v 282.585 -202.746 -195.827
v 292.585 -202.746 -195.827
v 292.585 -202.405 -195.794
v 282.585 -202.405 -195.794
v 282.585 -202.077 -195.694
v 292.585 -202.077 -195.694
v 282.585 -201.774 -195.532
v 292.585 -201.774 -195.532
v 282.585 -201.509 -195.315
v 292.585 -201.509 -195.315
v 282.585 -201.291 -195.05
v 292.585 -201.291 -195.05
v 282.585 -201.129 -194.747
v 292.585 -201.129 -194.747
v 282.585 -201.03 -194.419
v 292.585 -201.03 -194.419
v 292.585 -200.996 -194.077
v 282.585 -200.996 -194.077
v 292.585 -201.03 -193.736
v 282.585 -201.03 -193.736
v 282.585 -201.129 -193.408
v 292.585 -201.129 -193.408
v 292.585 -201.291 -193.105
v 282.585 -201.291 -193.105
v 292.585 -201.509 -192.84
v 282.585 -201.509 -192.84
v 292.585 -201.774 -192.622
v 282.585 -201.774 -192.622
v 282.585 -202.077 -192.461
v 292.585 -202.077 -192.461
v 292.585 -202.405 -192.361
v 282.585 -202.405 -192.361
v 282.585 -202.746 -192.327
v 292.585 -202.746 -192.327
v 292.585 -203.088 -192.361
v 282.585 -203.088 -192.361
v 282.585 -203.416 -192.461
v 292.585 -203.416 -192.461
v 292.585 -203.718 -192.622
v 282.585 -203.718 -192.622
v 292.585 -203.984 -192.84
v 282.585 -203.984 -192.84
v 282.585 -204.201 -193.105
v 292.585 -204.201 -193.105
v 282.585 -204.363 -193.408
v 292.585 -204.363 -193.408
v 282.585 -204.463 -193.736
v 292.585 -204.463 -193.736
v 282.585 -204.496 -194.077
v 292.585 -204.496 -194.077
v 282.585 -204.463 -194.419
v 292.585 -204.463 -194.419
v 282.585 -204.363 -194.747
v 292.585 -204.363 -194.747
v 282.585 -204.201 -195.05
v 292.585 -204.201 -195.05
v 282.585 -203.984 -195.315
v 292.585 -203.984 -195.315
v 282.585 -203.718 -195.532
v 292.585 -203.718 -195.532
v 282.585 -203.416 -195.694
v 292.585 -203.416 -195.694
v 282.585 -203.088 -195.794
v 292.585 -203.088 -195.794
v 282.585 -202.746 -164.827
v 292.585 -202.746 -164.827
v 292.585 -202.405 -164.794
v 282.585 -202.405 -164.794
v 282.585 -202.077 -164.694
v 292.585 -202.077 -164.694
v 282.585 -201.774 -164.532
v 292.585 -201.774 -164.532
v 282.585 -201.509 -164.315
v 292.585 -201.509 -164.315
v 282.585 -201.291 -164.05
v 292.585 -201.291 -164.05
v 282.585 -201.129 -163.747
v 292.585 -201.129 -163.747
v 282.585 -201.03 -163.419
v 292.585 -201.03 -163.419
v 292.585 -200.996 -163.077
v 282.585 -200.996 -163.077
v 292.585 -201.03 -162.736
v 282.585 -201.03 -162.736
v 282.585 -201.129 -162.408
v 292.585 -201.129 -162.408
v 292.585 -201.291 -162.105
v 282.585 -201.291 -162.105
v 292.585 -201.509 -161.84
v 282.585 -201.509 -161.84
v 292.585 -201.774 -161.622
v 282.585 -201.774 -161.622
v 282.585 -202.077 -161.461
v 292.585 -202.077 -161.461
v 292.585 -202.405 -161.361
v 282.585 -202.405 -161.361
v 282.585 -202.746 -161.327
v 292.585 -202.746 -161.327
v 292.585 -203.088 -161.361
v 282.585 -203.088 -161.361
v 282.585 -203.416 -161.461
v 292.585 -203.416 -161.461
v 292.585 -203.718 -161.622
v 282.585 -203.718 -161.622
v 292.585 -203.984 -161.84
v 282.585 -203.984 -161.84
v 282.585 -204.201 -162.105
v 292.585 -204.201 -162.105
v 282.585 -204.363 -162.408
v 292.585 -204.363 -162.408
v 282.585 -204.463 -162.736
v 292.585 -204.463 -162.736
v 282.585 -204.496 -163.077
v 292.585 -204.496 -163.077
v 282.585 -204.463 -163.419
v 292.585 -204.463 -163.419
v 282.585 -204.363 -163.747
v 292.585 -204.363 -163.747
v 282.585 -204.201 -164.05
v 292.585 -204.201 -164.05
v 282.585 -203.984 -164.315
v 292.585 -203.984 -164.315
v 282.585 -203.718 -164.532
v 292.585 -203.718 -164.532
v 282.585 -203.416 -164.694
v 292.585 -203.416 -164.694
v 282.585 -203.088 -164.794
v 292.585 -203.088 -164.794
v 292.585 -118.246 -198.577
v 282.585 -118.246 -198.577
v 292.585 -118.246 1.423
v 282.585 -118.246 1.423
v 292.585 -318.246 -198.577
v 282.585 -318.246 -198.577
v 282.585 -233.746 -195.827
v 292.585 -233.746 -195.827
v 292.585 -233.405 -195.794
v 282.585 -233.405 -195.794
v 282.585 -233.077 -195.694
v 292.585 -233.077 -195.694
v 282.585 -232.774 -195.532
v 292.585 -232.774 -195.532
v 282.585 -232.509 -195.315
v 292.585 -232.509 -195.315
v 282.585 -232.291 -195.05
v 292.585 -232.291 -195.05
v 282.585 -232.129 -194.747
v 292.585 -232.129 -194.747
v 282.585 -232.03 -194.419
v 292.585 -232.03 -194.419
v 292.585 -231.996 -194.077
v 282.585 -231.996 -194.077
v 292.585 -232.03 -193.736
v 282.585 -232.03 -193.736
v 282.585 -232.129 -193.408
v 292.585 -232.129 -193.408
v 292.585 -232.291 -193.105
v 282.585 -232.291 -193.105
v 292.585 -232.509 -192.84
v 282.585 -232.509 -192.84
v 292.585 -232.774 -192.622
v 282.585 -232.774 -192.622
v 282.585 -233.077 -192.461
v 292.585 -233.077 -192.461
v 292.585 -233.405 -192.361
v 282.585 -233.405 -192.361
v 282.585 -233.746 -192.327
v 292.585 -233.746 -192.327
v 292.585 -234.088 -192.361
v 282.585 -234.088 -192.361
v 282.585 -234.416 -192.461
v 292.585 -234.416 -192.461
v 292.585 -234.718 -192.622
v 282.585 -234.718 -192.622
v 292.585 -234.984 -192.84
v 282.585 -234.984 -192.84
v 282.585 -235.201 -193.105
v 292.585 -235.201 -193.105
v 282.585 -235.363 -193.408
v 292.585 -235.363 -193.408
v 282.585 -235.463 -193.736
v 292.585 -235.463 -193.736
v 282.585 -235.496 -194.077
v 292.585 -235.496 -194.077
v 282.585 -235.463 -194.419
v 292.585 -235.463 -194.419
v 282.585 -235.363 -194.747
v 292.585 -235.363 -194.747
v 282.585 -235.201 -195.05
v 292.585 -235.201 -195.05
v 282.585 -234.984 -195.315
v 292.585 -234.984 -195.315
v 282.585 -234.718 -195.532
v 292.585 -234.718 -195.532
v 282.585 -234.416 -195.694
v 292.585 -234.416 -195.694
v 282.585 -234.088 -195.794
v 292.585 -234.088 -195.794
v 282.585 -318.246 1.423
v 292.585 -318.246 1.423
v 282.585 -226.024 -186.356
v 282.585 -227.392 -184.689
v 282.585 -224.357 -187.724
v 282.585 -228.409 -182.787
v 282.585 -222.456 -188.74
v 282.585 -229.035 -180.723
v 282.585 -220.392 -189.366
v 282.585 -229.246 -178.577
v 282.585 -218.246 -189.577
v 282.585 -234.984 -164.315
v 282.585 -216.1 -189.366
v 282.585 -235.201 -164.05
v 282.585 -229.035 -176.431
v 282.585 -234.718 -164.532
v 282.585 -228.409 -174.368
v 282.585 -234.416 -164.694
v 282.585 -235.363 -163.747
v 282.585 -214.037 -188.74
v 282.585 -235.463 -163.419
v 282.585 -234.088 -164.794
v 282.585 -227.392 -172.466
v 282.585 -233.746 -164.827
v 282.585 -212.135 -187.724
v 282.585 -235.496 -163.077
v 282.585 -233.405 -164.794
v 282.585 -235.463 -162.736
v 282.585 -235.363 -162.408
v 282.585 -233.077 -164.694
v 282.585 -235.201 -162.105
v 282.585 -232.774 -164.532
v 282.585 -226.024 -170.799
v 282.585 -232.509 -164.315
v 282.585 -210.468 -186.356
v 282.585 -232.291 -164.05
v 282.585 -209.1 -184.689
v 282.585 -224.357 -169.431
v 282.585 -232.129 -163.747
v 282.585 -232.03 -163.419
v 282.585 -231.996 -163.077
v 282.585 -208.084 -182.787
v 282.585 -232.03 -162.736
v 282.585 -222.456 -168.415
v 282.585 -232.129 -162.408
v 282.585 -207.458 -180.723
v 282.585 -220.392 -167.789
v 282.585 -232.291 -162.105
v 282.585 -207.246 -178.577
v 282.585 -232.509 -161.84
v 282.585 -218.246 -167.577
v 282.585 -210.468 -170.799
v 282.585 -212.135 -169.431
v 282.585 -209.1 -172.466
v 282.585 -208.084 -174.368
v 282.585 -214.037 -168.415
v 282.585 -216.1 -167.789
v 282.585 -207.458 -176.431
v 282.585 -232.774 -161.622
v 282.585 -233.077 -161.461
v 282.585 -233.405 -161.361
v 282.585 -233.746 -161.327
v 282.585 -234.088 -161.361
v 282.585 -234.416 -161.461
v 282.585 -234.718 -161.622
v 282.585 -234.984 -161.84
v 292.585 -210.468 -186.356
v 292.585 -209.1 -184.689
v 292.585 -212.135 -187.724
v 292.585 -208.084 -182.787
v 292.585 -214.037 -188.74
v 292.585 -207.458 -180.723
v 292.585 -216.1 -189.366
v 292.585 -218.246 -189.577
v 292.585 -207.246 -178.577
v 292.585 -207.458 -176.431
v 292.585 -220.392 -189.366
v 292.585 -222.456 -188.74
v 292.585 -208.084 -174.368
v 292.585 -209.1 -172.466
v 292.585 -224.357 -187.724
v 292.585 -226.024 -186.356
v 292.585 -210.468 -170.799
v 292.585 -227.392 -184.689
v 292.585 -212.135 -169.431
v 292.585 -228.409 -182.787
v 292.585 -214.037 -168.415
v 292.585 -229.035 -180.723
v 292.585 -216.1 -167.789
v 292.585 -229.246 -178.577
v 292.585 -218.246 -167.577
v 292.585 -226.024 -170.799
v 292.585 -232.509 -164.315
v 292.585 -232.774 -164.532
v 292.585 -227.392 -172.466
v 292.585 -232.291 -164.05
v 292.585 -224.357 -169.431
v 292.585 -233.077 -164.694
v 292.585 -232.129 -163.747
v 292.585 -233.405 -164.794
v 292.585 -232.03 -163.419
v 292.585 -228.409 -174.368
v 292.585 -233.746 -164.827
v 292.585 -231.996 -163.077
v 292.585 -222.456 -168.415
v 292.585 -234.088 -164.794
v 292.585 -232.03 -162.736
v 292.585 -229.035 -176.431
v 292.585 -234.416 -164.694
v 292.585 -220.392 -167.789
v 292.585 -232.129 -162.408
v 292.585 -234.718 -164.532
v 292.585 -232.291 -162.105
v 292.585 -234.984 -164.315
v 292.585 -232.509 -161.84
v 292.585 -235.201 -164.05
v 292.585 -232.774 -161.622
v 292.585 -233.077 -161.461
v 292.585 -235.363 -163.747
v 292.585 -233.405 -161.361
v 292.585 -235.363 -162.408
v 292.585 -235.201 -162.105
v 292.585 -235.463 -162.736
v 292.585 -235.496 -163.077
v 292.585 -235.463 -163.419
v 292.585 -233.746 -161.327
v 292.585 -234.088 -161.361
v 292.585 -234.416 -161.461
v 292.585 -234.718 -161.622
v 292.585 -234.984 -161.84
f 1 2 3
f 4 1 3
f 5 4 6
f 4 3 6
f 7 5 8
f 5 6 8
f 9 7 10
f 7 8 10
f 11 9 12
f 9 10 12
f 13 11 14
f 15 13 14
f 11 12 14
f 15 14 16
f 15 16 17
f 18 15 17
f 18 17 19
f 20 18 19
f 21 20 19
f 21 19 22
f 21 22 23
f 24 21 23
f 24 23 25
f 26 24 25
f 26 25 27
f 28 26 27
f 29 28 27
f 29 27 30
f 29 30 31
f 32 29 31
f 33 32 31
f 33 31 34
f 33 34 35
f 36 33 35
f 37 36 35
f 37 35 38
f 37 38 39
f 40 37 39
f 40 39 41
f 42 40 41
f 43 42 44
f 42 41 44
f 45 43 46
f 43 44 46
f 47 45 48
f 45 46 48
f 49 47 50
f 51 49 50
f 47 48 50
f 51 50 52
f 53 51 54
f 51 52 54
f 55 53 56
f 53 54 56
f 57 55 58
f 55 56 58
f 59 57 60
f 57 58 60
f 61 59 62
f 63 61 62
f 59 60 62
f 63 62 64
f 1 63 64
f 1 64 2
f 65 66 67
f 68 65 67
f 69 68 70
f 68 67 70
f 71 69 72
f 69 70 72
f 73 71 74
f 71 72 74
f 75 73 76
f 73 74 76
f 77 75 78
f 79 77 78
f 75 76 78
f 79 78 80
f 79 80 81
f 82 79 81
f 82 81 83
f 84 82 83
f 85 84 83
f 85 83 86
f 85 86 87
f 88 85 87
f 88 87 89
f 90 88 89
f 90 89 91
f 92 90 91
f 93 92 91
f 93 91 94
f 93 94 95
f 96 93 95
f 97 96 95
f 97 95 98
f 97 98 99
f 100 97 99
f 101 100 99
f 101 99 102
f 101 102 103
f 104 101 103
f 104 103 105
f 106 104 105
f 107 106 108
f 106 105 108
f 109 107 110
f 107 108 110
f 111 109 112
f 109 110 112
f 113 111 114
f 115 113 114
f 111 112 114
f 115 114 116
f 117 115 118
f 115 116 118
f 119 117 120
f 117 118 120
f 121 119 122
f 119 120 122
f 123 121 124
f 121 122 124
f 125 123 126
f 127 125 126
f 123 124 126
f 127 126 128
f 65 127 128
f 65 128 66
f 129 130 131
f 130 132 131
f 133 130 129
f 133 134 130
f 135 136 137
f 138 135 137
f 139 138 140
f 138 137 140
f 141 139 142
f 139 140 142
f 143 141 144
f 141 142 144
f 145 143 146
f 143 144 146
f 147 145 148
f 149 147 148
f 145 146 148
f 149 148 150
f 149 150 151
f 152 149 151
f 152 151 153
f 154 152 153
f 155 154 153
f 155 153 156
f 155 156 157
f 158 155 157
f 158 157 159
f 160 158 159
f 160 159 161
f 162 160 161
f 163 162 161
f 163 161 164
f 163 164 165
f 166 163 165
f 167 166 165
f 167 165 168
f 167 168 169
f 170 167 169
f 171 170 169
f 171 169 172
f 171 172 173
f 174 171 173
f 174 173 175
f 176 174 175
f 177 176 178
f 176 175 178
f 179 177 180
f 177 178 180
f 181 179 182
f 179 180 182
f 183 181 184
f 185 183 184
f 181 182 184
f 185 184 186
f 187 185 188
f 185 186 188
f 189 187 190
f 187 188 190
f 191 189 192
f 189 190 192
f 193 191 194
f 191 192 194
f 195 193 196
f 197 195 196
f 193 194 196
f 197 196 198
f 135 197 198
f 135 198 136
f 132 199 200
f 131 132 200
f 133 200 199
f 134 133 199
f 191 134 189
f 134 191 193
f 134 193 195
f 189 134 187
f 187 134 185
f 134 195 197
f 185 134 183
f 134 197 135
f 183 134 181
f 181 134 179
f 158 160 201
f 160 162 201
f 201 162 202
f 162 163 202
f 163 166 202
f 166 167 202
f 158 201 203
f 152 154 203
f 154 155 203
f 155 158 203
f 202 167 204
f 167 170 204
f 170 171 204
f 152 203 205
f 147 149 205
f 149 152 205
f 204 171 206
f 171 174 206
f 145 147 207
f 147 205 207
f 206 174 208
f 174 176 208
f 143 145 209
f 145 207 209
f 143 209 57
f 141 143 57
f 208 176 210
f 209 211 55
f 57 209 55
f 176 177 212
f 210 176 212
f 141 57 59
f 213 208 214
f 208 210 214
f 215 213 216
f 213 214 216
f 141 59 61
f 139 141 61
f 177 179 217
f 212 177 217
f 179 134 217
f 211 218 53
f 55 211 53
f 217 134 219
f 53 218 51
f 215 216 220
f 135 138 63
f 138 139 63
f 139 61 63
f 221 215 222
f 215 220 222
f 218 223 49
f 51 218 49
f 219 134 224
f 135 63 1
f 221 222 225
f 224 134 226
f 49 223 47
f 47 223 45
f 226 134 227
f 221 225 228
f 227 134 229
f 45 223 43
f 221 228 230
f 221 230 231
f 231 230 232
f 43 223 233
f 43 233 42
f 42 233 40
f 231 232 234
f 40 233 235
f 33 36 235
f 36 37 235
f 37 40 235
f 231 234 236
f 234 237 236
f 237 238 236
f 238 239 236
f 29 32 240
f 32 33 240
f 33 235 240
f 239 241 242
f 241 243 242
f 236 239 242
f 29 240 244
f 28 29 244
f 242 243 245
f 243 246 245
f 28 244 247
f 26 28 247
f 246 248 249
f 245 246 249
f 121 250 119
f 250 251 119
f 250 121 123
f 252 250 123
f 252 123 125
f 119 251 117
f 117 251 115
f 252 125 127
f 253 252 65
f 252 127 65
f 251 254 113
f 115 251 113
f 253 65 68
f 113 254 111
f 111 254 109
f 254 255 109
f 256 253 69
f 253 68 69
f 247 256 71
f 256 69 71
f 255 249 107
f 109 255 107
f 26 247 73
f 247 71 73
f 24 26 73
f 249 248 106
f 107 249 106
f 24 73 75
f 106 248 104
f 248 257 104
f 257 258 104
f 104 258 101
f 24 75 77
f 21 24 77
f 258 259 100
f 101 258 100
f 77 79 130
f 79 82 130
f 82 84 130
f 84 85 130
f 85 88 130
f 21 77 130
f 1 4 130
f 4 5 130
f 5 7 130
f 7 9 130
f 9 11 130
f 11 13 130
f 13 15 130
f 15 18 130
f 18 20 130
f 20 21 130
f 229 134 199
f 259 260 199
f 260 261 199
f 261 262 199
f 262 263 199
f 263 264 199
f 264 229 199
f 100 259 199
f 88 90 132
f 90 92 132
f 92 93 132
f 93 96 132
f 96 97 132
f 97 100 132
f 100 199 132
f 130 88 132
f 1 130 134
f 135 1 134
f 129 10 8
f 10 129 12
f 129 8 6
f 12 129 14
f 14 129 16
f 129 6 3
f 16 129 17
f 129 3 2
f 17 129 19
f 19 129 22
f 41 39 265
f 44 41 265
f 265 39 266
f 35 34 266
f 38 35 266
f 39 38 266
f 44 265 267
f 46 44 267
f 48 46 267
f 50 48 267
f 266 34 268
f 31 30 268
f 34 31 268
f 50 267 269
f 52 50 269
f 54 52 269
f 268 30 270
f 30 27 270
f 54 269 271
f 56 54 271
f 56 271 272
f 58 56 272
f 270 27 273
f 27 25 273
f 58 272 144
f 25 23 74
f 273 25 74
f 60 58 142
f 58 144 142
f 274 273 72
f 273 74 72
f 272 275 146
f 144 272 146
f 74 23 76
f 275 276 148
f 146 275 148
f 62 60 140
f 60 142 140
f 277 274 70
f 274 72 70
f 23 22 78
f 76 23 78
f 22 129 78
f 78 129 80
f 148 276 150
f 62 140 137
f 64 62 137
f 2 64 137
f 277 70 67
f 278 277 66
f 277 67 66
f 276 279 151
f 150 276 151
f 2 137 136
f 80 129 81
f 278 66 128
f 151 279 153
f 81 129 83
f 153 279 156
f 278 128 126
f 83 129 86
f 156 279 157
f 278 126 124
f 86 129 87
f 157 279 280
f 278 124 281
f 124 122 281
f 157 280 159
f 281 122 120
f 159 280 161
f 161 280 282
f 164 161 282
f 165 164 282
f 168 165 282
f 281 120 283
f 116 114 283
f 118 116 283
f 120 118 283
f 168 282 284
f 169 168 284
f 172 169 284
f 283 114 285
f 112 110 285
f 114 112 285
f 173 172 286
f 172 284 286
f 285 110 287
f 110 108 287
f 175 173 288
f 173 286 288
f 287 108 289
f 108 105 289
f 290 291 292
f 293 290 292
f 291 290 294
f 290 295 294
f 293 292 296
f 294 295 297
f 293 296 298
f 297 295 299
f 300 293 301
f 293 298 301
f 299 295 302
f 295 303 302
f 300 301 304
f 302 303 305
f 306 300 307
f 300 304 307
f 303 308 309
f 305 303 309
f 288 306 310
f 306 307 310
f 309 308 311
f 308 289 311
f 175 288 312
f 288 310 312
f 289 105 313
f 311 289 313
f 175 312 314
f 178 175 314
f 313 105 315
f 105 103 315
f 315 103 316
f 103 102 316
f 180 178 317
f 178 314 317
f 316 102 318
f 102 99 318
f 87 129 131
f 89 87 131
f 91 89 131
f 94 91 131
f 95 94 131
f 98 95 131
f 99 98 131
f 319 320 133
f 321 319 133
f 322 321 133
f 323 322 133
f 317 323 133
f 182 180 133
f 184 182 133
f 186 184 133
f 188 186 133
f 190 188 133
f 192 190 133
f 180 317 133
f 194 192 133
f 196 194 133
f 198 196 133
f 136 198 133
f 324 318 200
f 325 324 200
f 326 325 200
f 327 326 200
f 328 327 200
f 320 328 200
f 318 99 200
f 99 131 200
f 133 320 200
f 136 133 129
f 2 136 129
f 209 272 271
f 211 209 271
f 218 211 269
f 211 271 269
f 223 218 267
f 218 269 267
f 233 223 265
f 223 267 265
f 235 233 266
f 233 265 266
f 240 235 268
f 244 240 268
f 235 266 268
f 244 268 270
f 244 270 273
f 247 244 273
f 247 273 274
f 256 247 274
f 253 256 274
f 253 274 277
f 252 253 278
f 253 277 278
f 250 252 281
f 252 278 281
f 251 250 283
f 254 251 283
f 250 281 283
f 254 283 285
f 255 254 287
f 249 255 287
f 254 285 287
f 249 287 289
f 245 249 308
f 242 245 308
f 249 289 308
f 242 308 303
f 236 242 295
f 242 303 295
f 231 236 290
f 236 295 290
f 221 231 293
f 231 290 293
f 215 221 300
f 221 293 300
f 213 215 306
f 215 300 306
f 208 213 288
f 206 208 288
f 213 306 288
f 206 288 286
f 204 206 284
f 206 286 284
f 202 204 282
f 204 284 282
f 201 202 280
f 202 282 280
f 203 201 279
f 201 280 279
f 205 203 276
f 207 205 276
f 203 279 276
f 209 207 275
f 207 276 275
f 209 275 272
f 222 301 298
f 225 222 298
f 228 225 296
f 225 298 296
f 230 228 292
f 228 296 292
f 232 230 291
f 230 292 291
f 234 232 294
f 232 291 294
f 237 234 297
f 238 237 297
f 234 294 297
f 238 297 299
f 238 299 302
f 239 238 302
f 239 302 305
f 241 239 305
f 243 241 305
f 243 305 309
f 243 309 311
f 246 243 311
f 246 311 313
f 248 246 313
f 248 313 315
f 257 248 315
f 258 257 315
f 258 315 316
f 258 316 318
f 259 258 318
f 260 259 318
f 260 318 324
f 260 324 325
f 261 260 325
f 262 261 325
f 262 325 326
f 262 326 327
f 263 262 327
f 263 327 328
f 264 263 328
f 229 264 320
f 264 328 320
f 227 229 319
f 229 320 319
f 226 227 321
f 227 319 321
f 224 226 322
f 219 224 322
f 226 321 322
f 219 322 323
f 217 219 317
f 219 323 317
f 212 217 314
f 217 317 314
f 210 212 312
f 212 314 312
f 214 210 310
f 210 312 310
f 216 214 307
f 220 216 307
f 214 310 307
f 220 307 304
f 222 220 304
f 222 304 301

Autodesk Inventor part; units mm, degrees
ref_plane "YZ Plane" through (0, 0, 0) normal (1, 0, 0) x (0, 1, 0)
ref_plane "XZ Plane" through (0, 0, 0) normal (0, 1, 0) x (-1, 0, 0)
ref_plane "XY Plane" through (0, 0, 0) normal (0, 0, 1) x (1, 0, 0)
ref_plane "Piano di lavoro1" through (-9.854, -197.5144, 1.4226) normal (0, 0, -1) x (1, 0, 0)
sketch "Schizzo1" plane through (-9.854, -197.5144, 1.4226) normal (0, 0, -1) x (1, 0, 0)
  line L0 (302.439, 120.7317) -> (292.439, 120.7317)
  line L1 (292.439, 120.7317) -> (292.439, -79.2683)
  line L2 (292.439, -79.2683) -> (302.439, -79.2683)
  line L3 (302.439, -79.2683) -> (302.439, 120.7317)
  point P0 (9.854, -197.5144)
  dimension "d0" = 200
  dimension "d1" = 10
extrude "Estrusione1" add sketch "Schizzo1" along normal blind 200
sketch "Schizzo2" plane through (292.585, -318.2462, 1.4226) normal (1, 0, 0) x (0, 0, -1)
  circle A0 centre (180, 100) radius 11
  line L0 (0, 0) -> (200, 0)
  line L1 (200, 0) -> (200, 200)
  line L2 (200, 200) -> (0, 200)
  line L3 (0, 200) -> (0, 0)
  circle A1 centre (164.5, 84.5) radius 1.75
  circle A2 centre (164.5, 115.5) radius 1.75
  circle A3 centre (195.5, 115.5) radius 1.75
  circle A4 centre (195.5, 84.5) radius 1.75
  point P0 (200, 100)
  dimension "d4" = 22
  dimension "d5" = 200
  dimension "d6" = 200
  dimension "d7" = 100
  dimension "d9" = 31
  dimension "d10" = 31
  dimension "d11" = 15.5
  dimension "d12" = 31
  dimension "d13" = 31
  dimension "d14" = 0
  dimension "d15" = 15.5
  dimension "d16" = 0
  dimension "d17" = 3.5
  dimension "d18" = 3.5
  dimension "d19" = 3.5
  dimension "d20" = 3.5
  dimension "d22" = 20
extrude "Estrusione2" cut sketch "Schizzo2" against normal blind 10 contours A0 | A1 | A2 | A3 | A4
equation "\"d10\" = d9"
equation "\"d11\" = 0.5 * d9"
equation "\"d12\" = d9"
equation "\"d13\" = d9"
equation "\"d15\" = 0.5 * d9"
equation "\"d18\" = d17"
equation "\"d19\" = d17"
equation "\"d20\" = d17"
properties part number "piano z"
